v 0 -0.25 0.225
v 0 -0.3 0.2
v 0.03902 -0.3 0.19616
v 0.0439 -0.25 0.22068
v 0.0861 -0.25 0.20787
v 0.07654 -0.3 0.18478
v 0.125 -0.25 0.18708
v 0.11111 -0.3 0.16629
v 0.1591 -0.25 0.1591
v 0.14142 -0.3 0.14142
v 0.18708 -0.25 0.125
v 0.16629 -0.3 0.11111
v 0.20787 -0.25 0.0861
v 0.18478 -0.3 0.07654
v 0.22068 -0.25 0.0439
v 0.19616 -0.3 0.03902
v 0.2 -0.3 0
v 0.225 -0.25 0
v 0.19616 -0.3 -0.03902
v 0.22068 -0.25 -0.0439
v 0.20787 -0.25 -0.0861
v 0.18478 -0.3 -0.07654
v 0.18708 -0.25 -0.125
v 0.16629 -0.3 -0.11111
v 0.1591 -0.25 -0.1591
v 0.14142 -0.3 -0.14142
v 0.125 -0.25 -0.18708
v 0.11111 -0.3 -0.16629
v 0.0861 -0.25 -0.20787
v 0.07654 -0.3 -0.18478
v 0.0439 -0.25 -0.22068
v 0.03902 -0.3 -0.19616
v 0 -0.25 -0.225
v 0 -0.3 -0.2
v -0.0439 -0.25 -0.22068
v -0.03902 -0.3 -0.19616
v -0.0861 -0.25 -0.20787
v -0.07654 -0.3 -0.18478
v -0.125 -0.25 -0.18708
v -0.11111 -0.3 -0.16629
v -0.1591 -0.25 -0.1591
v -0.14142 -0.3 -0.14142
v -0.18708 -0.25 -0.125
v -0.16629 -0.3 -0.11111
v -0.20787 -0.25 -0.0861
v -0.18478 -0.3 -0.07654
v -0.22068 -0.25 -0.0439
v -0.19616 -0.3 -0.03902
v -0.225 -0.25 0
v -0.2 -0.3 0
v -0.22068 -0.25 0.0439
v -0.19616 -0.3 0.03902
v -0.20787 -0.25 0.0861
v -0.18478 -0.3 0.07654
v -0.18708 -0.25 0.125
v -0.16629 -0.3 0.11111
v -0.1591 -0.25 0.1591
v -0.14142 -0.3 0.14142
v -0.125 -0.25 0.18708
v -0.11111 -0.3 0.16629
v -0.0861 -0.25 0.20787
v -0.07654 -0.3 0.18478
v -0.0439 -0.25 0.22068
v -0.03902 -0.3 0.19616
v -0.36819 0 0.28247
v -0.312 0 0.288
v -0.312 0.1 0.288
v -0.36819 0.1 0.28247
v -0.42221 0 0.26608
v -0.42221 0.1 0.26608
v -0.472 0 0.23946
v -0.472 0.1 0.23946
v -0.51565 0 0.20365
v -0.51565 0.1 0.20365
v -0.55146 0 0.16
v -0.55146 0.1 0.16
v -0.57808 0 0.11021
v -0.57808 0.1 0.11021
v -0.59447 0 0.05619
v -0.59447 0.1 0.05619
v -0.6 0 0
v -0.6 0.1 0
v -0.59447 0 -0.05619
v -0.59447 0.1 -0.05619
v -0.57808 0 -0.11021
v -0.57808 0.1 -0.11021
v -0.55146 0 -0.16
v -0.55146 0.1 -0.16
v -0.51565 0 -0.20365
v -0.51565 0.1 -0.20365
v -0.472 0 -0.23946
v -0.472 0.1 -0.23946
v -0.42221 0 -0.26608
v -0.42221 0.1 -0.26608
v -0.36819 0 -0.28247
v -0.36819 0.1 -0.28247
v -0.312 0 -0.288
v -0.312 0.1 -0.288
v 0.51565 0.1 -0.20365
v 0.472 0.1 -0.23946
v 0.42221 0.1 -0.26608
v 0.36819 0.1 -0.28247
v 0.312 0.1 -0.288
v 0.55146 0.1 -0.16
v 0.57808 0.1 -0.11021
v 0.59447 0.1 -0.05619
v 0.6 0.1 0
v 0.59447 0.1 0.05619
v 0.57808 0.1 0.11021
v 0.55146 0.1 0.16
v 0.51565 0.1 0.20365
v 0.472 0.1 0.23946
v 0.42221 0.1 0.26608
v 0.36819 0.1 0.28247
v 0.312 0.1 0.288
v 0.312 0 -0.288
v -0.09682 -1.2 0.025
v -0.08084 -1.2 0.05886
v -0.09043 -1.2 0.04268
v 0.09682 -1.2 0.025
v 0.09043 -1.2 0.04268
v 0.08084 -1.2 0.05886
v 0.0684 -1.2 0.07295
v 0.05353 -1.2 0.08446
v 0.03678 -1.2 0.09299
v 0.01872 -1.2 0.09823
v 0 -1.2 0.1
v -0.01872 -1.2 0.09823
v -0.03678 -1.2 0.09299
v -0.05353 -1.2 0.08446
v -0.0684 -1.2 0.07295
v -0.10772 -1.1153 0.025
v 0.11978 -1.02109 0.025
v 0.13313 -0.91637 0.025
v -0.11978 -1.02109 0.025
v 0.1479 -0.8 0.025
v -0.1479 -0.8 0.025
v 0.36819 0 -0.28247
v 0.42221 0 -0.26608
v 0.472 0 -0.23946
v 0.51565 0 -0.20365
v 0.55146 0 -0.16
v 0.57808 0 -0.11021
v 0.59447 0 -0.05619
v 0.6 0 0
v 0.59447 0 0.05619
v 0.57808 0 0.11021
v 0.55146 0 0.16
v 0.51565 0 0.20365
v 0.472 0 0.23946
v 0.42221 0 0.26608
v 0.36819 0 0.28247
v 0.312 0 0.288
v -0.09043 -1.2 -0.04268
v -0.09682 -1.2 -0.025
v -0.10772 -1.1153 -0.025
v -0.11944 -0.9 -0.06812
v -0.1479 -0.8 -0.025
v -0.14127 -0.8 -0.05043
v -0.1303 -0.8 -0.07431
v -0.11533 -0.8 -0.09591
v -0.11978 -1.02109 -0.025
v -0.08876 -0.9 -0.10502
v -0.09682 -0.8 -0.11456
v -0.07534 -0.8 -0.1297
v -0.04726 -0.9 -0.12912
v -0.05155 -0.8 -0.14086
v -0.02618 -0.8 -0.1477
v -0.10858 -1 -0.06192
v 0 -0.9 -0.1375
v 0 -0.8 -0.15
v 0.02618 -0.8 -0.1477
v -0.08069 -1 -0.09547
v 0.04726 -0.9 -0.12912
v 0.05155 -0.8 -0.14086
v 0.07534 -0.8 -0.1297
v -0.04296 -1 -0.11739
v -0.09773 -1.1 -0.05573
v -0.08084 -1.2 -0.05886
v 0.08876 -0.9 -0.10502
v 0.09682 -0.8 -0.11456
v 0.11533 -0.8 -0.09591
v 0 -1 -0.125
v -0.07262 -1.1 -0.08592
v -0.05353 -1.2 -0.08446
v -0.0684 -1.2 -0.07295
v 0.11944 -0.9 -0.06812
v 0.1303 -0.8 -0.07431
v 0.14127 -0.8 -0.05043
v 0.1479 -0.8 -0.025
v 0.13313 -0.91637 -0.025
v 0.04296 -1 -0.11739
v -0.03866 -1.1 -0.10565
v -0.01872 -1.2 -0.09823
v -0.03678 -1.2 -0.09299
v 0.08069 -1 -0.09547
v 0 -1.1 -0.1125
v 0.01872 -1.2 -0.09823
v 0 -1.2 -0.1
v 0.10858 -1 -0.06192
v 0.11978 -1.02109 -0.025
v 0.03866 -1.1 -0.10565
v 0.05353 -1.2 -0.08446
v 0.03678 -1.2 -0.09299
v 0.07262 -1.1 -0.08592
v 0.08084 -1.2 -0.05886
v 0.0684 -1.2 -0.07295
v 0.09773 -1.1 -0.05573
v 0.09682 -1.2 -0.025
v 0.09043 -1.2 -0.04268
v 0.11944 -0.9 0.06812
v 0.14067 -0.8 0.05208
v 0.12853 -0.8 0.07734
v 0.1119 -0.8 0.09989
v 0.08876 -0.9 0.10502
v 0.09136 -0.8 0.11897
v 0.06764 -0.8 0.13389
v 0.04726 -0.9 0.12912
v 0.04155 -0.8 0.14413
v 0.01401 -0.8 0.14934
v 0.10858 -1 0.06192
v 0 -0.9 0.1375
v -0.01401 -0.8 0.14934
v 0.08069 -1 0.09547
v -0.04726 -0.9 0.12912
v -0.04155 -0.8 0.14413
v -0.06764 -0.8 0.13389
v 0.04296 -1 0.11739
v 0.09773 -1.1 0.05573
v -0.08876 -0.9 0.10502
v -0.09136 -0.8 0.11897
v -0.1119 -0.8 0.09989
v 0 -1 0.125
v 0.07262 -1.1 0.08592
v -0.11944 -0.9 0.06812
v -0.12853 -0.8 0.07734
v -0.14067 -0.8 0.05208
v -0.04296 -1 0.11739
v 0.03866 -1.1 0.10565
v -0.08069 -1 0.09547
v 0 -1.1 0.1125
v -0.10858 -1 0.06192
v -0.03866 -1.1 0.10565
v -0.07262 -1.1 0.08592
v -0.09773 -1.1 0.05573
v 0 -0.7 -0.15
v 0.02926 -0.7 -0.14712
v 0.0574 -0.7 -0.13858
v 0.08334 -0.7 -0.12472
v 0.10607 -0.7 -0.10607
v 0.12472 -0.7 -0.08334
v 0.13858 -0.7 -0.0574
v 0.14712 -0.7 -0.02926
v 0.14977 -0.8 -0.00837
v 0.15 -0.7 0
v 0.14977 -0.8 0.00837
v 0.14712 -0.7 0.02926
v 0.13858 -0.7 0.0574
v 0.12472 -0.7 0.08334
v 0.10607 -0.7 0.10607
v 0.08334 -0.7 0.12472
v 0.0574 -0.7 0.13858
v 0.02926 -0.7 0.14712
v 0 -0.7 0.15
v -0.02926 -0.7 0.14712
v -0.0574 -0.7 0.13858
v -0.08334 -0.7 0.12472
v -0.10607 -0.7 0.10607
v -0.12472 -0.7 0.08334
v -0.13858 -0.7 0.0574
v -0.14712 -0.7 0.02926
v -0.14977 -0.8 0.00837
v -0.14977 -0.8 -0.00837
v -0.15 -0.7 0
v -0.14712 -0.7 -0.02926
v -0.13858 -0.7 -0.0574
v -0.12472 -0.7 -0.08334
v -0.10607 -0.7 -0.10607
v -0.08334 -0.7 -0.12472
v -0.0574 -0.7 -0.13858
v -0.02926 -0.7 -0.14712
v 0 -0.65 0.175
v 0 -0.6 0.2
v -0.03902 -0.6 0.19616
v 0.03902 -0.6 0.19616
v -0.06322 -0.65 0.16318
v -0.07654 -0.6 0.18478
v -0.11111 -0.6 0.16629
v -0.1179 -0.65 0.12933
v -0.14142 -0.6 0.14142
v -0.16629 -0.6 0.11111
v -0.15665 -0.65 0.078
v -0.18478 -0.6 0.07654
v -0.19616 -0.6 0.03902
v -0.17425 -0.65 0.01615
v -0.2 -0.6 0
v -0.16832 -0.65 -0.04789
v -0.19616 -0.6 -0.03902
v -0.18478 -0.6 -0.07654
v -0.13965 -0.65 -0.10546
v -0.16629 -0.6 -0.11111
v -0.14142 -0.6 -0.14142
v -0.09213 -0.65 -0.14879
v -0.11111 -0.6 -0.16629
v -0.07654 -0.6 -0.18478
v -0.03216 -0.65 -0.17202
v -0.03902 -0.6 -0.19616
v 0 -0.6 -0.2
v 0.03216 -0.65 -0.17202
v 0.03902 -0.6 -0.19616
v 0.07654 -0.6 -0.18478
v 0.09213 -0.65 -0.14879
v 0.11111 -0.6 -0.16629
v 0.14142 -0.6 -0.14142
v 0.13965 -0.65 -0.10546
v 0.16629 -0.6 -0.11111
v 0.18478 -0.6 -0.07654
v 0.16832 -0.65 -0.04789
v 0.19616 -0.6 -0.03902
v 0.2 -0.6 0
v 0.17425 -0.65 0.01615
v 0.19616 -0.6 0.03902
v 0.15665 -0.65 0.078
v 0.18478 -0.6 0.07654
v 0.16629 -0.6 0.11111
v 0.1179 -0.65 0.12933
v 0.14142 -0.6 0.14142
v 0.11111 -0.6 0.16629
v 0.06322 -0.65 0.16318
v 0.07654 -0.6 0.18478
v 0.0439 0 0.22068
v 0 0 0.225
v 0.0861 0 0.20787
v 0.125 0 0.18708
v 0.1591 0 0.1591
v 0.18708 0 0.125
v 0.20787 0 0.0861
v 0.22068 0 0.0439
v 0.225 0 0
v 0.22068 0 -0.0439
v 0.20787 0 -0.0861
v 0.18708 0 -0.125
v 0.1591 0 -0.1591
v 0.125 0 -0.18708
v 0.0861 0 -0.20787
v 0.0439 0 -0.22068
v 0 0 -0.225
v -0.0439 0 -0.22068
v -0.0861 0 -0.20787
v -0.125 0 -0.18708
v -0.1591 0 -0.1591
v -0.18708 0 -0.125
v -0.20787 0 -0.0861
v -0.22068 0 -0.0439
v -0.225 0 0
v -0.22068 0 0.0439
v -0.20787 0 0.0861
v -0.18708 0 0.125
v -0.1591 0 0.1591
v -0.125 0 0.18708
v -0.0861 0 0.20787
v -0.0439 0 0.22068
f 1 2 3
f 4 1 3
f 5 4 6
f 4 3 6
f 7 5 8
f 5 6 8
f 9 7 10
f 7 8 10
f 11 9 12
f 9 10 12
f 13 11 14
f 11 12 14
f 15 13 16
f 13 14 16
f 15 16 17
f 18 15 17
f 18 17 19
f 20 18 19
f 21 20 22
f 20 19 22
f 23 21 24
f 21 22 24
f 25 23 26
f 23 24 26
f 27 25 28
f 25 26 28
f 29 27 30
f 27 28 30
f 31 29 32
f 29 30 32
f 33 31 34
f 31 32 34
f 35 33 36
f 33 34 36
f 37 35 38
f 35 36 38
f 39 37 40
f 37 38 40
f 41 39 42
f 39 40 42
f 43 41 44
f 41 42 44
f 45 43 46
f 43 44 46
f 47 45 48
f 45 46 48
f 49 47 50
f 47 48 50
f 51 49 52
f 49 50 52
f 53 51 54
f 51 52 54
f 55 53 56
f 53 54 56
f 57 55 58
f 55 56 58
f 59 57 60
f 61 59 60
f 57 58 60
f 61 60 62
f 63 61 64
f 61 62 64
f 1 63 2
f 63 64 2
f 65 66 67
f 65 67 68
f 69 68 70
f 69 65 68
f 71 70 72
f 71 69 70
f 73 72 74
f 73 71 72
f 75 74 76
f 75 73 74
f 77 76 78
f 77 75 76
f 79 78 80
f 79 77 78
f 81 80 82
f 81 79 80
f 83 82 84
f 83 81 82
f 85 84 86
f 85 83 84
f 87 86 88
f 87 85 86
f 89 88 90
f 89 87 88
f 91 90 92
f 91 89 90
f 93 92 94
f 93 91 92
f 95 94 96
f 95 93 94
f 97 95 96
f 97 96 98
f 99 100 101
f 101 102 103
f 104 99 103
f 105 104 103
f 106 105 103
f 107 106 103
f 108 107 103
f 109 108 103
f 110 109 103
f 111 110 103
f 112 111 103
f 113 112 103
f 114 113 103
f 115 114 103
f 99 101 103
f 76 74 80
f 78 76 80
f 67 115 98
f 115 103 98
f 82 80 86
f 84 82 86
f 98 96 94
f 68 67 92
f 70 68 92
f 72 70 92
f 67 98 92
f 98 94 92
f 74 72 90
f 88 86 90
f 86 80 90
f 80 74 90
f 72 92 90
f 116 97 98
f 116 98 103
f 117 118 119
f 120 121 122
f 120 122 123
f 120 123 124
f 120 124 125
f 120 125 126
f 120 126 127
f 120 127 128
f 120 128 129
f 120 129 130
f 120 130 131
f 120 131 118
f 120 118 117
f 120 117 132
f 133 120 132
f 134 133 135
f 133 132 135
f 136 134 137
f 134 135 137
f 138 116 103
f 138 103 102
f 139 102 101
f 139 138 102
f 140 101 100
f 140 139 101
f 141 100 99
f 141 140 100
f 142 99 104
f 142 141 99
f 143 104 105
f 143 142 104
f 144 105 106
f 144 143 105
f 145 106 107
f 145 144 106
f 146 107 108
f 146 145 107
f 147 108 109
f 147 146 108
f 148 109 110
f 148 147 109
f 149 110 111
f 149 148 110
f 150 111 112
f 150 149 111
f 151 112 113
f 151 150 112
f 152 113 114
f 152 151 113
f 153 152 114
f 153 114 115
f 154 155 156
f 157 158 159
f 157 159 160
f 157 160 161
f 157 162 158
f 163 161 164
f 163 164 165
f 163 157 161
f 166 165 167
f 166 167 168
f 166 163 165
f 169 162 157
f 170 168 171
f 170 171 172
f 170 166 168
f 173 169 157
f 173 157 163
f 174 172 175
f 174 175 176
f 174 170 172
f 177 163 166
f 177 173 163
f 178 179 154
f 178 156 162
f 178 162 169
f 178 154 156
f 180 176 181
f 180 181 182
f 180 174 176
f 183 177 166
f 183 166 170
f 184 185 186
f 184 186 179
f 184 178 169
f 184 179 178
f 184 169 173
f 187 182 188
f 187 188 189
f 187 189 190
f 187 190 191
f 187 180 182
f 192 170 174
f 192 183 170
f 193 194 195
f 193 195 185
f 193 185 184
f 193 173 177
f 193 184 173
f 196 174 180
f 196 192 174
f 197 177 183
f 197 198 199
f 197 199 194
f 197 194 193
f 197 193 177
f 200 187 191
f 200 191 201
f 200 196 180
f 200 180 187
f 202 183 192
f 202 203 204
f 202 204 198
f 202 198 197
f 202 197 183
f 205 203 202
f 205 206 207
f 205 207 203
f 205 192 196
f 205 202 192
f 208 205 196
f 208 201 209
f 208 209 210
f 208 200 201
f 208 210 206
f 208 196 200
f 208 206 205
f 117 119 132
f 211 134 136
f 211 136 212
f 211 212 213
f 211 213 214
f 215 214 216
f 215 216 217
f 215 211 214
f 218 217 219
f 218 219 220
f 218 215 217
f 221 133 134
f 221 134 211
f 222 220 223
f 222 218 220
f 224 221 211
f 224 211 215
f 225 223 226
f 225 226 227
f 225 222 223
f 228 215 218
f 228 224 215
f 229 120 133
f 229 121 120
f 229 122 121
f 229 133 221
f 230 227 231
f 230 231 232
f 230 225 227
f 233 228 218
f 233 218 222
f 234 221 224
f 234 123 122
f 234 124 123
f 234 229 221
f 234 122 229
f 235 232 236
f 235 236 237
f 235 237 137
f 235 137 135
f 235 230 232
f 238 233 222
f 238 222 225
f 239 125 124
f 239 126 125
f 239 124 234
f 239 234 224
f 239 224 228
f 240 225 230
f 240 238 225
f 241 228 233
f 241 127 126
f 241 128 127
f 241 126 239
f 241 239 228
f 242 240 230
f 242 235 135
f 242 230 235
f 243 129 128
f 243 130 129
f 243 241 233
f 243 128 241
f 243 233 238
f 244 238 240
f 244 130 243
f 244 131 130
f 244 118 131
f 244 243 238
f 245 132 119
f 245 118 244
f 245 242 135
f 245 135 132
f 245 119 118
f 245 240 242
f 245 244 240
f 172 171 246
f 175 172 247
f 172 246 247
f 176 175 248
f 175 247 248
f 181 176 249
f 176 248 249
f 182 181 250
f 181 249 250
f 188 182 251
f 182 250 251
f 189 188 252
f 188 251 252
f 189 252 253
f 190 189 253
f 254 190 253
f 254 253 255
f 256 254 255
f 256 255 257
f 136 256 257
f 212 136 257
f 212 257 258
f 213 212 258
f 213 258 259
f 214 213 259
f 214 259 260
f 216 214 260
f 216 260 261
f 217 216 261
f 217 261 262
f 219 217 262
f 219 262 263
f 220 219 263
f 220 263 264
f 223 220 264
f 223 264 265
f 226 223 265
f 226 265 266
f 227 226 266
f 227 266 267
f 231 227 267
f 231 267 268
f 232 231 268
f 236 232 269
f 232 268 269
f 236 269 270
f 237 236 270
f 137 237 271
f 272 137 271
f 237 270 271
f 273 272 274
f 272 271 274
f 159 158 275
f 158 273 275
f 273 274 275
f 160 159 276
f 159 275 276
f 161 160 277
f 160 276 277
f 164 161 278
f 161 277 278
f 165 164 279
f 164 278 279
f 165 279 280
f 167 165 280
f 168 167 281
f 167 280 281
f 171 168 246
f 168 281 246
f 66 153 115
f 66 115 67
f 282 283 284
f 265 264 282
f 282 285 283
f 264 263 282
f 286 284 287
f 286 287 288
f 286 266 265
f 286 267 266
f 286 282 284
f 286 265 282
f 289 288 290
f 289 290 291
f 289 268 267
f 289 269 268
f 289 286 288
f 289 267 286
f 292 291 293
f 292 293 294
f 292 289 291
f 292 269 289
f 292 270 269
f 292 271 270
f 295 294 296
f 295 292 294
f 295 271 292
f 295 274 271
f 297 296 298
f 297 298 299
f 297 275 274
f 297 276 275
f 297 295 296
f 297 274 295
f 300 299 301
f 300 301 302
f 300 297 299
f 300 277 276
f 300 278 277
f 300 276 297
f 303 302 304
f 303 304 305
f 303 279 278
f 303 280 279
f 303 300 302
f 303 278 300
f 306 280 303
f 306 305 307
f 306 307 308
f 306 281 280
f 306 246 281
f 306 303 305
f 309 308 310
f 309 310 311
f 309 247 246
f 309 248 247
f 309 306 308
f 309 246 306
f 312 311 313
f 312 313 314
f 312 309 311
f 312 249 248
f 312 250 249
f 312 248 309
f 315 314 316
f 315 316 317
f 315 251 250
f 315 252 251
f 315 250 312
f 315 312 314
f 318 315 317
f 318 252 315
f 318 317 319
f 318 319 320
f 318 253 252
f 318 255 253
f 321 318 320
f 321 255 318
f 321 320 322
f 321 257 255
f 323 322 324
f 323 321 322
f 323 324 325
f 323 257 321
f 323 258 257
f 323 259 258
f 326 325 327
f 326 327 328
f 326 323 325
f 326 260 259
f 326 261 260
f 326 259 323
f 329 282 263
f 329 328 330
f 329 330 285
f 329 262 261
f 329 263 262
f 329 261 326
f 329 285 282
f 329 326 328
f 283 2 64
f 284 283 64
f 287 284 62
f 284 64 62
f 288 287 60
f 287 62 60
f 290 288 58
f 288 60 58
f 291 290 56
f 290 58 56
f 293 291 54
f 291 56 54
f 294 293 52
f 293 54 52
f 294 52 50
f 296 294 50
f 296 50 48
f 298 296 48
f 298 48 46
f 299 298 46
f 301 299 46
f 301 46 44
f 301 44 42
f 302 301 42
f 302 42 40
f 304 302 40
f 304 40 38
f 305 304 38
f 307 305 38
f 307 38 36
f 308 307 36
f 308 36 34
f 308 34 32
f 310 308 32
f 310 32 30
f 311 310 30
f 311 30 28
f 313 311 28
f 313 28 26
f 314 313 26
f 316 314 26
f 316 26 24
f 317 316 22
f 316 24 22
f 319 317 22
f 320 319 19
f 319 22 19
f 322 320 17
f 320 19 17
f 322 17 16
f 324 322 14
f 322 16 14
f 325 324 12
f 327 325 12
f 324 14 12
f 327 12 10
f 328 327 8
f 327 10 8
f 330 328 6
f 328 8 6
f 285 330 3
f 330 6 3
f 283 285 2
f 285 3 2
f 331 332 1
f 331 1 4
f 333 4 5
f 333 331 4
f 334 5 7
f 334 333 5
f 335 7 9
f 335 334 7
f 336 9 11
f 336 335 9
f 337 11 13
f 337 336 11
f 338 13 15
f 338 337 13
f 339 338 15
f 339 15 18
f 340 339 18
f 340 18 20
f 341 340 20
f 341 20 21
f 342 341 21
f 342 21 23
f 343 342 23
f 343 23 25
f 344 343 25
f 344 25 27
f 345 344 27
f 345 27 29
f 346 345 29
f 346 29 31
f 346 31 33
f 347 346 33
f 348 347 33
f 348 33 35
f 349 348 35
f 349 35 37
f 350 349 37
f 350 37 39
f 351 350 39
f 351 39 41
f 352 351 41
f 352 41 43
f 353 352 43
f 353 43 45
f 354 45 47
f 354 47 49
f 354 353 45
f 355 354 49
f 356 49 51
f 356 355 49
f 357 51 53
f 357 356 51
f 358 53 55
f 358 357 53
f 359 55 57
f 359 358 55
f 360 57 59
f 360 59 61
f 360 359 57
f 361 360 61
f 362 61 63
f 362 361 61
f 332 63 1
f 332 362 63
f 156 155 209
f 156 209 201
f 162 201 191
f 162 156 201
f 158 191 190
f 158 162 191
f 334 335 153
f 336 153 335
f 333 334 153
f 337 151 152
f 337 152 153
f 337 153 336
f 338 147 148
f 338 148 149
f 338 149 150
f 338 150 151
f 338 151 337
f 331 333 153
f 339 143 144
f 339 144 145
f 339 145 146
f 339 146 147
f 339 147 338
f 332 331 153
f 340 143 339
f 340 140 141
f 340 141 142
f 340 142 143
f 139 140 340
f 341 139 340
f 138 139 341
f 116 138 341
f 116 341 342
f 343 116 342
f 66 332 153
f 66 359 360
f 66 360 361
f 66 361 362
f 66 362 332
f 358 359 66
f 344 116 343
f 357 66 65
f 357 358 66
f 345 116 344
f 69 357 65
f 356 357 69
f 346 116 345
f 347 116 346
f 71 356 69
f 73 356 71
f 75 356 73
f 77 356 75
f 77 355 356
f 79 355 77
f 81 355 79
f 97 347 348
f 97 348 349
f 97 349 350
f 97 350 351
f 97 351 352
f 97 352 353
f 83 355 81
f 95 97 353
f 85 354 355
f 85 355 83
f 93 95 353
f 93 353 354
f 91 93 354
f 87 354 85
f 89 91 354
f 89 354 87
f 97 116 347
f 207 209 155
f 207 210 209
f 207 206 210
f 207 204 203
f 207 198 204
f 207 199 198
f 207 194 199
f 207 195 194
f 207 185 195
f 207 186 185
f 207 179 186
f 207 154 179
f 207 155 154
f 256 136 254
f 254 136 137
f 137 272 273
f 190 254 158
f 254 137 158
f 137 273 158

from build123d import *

# Parameters (mm, degrees)
BOSS_EXTRUDE1_DEPTH     = 0.1
SKETCH2_R               = 0.225
BOSS_EXTRUDE2_DEPTH     = 0.3
SKETCH3_R               = 0.2
BOSS_EXTRUDE3_DEPTH     = 0.4
SKETCH4_R               = 0.15
BOSS_EXTRUDE4_DEPTH     = 0.1
SKETCH5_R               = 0.15
BOSS_EXTRUDE5_DEPTH     = 0.4
CHAMFER1_SIZE           = 0.05
CHAMFER1_SIZE_2         = 0.025
CHAMFER2_SIZE           = 0.1
CHAMFER2_SIZE_2         = 0.05
CHAMFER3_SIZE           = 0.4
CHAMFER3_SIZE2          = 0.05
CUT_EXTRUDE1_DEPTH      = 2.372204066
CUT_EXTRUDE1_DEPTH_BACK = 2.372204066
SKETCH6_W               = 0.05
SKETCH6_H               = 0.517449495


with BuildPart() as part:
    # Sketch1 → Boss-Extrude1 (new body)
    with BuildSketch(Plane(origin=(0, 0, 0), x_dir=(1, 0, 0), z_dir=(0, 1, 0))):
        with BuildLine():
            Line((-0.312, 0.288), (0.312, 0.288))
            ThreePointArc((0.312, 0.288), (0.6, 0), (0.312, -0.288))
            Line((0.312, -0.288), (-0.312, -0.288))
            ThreePointArc((-0.312, -0.288), (-0.6, 0), (-0.312, 0.288))
        make_face()
    extrude(amount=BOSS_EXTRUDE1_DEPTH)

    # Sketch2 → Boss-Extrude2 (add)
    with BuildSketch(Plane(origin=(0, 0, 0), x_dir=(1, 0, 0), z_dir=(0, 1, 0))):
        with Locations(Location((0, 0, 0), (0, 0, 270))):
            Circle(SKETCH2_R)
    extrude(amount=-BOSS_EXTRUDE2_DEPTH)

    # Sketch3 → Boss-Extrude3 (add)
    with BuildSketch(Plane.XZ.offset(0.3)):
        with Locations(Location((0, 0, 0), (0, 0, 90))):
            Circle(SKETCH3_R)
    extrude(amount=BOSS_EXTRUDE3_DEPTH)

    # Sketch4 → Boss-Extrude4 (add)
    with BuildSketch(Plane.XZ.offset(0.7)):
        with Locations(Location((0, 0, 0), (0, 0, 270))):
            Circle(SKETCH4_R)
    extrude(amount=BOSS_EXTRUDE4_DEPTH)

    # Sketch5 → Boss-Extrude5 (add)
    with BuildSketch(Plane.XZ.offset(0.8)):
        with Locations(Location((0, 0, 0), (0, 0, 270))):
            Circle(SKETCH5_R)
    extrude(amount=BOSS_EXTRUDE5_DEPTH)

    # Chamfer1
    # the kernel refuses this chamfer: 0.05, 0.025 mm, written as the material it takes off along each edge
    with BuildSketch(Plane(origin=(0, -0.3, 0), x_dir=(0, 0, 1), z_dir=(-1, 0, 0))) as chamfer1_piece_1_section:
        Polygon((0.225, CHAMFER1_SIZE), (0.225 - CHAMFER1_SIZE_2, 0), (0.225, 0), align=None)
    chamfer1_piece_1 = revolve(axis=Axis((0, -0.3, 0), (0, 1, 0)), mode=Mode.PRIVATE)
    chamfer1_piece_1 = chamfer1_piece_1 - Plane(origin=(0, -0.274549164, 0), x_dir=(0, 0, 1), z_dir=(0, 1, 0)) * Cylinder(0.2, 1, mode=Mode.PRIVATE)
    add(chamfer1_piece_1, mode=Mode.SUBTRACT)

    # Chamfer2
    # the kernel refuses this chamfer: 0.1, 0.05 mm, written as the material it takes off along each edge
    with BuildSketch(Plane(origin=(0, -0.7, 0), x_dir=(0, 0, 1), z_dir=(1, 0, 0))) as chamfer2_piece_1_section:
        Polygon((0.2, -CHAMFER2_SIZE), (0.2 - CHAMFER2_SIZE_2, 0), (0.2, 0), align=None)
    chamfer2_piece_1 = revolve(axis=Axis((0, -0.7, 0), (0, -1, 0)), mode=Mode.PRIVATE)
    chamfer2_piece_1 = chamfer2_piece_1 - Plane(origin=(0, -0.64887778, 0), x_dir=(0, 0, -1), z_dir=(0, 1, 0)) * Cylinder(0.15, 1, mode=Mode.PRIVATE)
    add(chamfer2_piece_1, mode=Mode.SUBTRACT)

    # Chamfer3
    chamfer3_edges = [part.edges().sort_by_distance(p)[0] for p in [
        (0, -1.2, 0.15),
    ]]
    chamfer3_side = [part.faces().sort_by_distance(p)[0] for p in [
        (0, -0.95, 0.15),
    ]]
    chamfer(chamfer3_edges, length=CHAMFER3_SIZE, length2=CHAMFER3_SIZE2, reference=chamfer3_side[0])

    # Sketch6 → Cut-Extrude1 (cut, two sides: drawn at the far end of the back side and taken through both)
    with BuildSketch(Plane(origin=(0, 0, 0), x_dir=(0, 0, -1), z_dir=(1, 0, 0)).offset(-CUT_EXTRUDE1_DEPTH_BACK)):
        with Locations((0, -1.058724748)):
            Rectangle(SKETCH6_W, SKETCH6_H)
    extrude(amount=CUT_EXTRUDE1_DEPTH + CUT_EXTRUDE1_DEPTH_BACK, mode=Mode.SUBTRACT)


solid = part.part
